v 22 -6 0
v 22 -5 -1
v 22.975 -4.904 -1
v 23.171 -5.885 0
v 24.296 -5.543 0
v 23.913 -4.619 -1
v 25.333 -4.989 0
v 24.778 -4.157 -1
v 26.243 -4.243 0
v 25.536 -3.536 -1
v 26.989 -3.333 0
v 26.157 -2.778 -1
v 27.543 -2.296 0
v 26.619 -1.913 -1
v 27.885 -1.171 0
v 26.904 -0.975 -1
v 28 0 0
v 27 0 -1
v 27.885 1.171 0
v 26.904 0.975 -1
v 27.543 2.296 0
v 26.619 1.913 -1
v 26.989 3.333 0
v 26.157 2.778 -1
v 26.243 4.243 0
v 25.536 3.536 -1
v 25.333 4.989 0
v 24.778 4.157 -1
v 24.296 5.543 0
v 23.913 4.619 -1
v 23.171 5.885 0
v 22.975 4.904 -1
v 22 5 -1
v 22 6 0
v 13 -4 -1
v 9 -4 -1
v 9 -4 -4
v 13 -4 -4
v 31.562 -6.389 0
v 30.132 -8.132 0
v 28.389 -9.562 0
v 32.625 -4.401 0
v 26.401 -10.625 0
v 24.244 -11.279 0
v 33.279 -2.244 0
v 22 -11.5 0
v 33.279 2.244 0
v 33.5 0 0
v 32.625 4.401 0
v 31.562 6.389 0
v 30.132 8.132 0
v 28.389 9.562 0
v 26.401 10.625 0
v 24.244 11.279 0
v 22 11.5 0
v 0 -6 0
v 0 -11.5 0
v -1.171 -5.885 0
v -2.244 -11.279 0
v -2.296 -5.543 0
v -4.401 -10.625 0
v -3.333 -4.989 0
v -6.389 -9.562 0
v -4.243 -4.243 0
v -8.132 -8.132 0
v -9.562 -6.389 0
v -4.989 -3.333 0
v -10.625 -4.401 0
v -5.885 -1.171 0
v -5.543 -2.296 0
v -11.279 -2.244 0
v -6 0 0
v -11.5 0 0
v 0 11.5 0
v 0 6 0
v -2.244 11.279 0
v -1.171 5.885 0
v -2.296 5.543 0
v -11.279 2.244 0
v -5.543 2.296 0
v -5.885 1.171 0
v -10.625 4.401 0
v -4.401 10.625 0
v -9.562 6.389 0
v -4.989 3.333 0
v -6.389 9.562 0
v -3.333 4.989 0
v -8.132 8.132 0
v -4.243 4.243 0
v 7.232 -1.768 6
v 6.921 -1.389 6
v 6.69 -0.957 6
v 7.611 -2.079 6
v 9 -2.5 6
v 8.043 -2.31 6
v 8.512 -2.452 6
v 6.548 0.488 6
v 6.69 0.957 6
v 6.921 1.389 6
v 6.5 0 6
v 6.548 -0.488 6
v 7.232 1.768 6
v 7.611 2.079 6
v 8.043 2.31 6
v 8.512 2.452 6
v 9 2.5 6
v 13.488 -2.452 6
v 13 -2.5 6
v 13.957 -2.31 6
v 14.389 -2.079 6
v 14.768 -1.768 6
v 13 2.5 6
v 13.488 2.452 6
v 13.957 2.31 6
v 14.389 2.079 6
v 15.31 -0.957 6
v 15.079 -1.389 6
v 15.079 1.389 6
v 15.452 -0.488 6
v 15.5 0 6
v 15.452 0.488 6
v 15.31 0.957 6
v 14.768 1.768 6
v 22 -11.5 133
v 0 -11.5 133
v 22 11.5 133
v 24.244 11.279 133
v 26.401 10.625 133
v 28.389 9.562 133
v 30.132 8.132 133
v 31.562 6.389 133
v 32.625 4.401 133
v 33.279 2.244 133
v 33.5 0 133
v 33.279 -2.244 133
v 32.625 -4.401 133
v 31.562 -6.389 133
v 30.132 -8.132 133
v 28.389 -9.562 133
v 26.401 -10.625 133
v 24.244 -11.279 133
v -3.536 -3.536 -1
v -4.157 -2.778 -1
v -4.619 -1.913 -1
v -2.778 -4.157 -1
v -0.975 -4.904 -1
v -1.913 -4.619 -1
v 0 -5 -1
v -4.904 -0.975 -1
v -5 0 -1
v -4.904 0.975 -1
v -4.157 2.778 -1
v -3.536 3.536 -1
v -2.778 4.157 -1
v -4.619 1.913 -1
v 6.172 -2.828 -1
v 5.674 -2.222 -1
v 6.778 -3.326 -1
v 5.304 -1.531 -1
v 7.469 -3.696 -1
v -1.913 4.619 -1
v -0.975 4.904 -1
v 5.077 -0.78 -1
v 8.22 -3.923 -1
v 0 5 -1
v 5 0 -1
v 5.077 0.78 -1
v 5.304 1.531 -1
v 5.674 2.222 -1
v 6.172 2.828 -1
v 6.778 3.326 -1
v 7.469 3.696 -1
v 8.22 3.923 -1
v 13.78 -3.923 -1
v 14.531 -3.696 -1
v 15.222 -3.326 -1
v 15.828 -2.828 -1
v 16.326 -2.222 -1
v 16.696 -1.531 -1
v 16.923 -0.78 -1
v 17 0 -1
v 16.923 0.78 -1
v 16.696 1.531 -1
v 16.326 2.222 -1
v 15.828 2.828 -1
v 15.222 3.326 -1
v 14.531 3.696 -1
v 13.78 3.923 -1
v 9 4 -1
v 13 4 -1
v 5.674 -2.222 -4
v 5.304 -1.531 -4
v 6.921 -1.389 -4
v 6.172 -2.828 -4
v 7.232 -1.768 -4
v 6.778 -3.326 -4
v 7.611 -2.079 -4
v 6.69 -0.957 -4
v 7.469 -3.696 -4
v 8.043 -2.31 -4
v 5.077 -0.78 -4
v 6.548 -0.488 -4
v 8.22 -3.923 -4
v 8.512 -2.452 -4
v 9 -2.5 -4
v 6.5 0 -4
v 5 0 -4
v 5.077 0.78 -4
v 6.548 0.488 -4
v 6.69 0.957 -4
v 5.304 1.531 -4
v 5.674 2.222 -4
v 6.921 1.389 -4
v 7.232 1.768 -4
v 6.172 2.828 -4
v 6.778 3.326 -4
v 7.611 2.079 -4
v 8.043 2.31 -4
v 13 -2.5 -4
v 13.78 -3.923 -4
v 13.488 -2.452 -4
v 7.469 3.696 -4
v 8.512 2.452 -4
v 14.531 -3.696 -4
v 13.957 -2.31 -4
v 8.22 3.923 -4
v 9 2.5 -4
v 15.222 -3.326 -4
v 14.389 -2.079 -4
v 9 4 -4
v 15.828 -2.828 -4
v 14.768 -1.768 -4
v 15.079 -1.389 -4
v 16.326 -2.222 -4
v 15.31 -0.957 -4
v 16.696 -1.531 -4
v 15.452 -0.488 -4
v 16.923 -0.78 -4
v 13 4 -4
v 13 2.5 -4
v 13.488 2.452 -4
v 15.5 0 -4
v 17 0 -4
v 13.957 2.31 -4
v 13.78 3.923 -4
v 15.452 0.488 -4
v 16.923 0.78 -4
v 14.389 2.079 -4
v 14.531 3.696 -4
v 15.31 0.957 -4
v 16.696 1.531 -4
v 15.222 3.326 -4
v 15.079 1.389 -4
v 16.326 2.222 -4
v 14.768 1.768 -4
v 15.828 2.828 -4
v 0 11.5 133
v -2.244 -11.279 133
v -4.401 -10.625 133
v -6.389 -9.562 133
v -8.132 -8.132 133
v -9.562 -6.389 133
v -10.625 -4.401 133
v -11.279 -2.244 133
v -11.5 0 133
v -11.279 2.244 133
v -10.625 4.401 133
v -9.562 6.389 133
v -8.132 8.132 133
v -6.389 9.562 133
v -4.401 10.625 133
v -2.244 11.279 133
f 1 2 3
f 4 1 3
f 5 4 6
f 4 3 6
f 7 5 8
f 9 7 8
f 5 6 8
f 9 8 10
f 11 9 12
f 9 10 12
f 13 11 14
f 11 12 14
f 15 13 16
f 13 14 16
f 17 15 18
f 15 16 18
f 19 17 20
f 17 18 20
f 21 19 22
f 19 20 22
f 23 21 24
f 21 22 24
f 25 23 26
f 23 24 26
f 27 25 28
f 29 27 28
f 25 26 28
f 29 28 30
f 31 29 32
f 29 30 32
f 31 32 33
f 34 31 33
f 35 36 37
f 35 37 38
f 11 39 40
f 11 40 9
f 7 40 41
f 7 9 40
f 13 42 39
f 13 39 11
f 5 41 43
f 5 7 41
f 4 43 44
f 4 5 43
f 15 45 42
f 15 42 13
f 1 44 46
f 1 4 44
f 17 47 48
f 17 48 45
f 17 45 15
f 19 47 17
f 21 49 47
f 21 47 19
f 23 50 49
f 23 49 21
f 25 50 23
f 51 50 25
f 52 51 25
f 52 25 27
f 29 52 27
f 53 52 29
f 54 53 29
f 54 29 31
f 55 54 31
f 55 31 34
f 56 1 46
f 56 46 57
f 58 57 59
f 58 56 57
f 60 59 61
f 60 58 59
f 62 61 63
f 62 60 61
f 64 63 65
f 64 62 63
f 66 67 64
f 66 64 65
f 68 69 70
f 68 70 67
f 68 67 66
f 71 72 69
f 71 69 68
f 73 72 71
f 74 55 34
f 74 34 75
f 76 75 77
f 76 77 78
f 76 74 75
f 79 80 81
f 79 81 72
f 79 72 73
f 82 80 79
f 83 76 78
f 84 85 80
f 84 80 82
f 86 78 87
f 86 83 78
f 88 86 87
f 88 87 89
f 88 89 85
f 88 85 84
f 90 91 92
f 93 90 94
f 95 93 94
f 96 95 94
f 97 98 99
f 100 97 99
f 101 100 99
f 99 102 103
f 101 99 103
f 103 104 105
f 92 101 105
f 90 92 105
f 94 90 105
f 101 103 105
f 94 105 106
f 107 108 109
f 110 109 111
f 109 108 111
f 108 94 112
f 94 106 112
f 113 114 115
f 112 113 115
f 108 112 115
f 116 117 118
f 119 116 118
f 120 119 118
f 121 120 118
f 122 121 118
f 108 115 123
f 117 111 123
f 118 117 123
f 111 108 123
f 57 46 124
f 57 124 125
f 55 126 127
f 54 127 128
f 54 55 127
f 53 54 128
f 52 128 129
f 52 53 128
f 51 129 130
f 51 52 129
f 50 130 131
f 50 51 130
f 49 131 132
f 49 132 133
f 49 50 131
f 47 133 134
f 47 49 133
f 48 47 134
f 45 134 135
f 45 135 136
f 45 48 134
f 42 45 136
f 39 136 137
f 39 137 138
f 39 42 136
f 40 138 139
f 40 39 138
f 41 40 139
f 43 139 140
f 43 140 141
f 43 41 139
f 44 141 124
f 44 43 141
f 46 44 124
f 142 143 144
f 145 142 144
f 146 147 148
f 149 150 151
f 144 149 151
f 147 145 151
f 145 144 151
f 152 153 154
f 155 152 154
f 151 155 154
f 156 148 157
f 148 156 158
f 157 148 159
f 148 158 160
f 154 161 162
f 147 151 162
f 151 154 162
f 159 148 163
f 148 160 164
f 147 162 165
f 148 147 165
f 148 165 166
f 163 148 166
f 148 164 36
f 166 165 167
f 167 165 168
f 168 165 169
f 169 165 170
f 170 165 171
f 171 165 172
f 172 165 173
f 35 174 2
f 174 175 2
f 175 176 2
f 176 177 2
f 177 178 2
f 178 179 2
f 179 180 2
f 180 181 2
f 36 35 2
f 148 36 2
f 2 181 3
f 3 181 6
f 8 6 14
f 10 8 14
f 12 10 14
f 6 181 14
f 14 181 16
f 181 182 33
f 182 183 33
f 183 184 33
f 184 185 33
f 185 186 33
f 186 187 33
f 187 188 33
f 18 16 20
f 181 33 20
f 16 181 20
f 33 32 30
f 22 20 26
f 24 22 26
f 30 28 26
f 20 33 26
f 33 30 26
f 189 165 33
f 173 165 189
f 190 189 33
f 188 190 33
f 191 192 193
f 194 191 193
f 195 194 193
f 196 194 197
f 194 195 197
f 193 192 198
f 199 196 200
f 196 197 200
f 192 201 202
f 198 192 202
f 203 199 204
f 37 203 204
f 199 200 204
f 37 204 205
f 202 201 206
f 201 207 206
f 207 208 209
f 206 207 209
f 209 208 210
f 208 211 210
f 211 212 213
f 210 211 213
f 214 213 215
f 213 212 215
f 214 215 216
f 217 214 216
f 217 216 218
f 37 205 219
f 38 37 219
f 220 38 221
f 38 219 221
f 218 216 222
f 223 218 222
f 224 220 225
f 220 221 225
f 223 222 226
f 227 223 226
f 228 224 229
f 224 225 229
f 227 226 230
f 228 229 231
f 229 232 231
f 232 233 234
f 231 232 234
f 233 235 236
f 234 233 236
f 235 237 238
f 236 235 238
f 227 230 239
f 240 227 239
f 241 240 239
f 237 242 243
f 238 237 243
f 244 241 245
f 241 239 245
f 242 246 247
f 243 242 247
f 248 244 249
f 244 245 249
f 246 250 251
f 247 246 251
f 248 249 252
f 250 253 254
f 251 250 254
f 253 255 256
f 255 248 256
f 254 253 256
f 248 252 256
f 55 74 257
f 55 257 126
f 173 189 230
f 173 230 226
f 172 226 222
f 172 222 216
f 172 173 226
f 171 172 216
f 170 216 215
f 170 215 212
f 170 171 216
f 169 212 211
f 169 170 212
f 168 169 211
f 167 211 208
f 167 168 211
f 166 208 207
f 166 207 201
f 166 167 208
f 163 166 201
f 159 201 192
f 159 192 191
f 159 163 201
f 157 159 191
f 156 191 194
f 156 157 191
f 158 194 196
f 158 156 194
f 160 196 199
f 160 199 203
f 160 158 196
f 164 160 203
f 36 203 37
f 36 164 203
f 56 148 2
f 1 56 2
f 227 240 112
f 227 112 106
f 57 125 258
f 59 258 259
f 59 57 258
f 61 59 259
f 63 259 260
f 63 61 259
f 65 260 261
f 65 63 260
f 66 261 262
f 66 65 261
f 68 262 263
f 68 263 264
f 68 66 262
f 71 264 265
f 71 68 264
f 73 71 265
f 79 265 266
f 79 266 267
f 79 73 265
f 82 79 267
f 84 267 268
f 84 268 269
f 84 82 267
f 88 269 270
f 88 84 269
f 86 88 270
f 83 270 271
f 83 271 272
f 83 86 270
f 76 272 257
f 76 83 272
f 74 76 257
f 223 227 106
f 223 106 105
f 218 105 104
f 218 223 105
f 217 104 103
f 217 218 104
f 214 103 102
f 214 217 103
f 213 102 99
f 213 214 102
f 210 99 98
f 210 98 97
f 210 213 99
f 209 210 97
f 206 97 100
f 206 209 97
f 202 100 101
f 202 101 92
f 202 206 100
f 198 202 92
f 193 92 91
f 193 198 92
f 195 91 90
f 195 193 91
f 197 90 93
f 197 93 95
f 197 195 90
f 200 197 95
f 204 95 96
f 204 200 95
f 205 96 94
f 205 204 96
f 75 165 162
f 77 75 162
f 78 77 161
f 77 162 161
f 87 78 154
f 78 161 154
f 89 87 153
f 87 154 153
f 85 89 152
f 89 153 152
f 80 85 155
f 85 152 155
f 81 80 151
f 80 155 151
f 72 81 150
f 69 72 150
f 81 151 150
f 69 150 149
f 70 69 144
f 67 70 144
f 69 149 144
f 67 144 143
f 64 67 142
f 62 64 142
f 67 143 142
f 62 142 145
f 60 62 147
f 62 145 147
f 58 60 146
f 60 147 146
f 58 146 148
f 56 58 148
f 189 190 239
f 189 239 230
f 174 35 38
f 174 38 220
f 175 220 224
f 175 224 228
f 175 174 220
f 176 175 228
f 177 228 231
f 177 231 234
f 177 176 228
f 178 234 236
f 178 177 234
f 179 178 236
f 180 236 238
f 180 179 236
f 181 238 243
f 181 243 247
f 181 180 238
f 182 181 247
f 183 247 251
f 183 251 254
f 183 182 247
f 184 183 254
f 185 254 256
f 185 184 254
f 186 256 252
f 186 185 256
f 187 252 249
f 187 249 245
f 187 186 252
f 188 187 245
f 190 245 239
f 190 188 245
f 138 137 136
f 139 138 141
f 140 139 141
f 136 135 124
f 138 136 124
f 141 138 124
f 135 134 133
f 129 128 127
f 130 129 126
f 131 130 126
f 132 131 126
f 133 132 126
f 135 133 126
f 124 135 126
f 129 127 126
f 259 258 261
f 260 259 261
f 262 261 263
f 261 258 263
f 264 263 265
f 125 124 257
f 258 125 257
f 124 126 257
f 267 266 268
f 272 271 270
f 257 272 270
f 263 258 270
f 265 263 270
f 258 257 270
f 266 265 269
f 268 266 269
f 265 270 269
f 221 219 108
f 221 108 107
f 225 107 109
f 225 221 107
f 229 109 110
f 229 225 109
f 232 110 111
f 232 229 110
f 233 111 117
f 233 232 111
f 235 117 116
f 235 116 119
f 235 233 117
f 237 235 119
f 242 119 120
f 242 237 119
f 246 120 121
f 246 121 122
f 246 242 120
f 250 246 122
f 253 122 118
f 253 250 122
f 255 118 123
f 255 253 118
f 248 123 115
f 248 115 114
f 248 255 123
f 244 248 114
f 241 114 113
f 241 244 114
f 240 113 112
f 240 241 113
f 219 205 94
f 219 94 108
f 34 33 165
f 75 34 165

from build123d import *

# Parameters (mm, degrees)
EXTRUSION1_DEPTH = 133
EXTRUSION2_DEPTH = 1
CHANFREIN1_SIZE  = 1
EXTRUSION3_DEPTH = 3
EXTRUSION4_DEPTH = 10


with BuildPart() as part:
    # Esquisse1 → Extrusion1 (new body)
    with BuildSketch(Plane.XY):
        with BuildLine():
            Line((0, 11.5), (22, 11.5))
            ThreePointArc((22, 11.5), (33.5, 0), (22, -11.5))
            Line((22, -11.5), (0, -11.5))
            ThreePointArc((0, -11.5), (-11.5, 0), (0, 11.5))
        make_face()
    extrude(amount=EXTRUSION1_DEPTH)

    # Esquisse2 → Extrusion2 (add)
    with BuildSketch(Plane(origin=(0, 0, 0), x_dir=(-1, 0, 0), z_dir=(0, 0, -1))):
        with BuildLine():
            Line((-22, 5), (0, 5))
            ThreePointArc((0, 5), (5, 0), (0, -5))
            Line((0, -5), (-22, -5))
            ThreePointArc((-22, -5), (-27, 0), (-22, 5))
        make_face()
    extrude(amount=EXTRUSION2_DEPTH)

    # Chanfrein1
    chanfrein1_edges = [part.edges().sort_by_distance(p)[0] for p in [
        (11, 5, 0),
        (-5, 0, 0),
        (27, 0, 0),
        (11, -5, 0),
    ]]
    chamfer(chanfrein1_edges, length=CHANFREIN1_SIZE - 0.0001)  # a hair under: the kernel refuses the full size

    # Esquisse3 → Extrusion3 (add)
    with BuildSketch(Plane(origin=(0, 0, -1), x_dir=(-1, 0, 0), z_dir=(0, 0, -1))):
        with BuildLine():
            Line((-13, 4), (-9, 4))
            ThreePointArc((-9, 4), (-5, 0), (-9, -4))
            Line((-9, -4), (-13, -4))
            ThreePointArc((-13, -4), (-17, 0), (-13, 4))
        make_face()
    extrude(amount=EXTRUSION3_DEPTH)

    # Esquisse4 → Extrusion4 (cut)
    with BuildSketch(Plane(origin=(0, 0, -4), x_dir=(-1, 0, 0), z_dir=(0, 0, -1))):
        with BuildLine():
            Line((-13, 2.5), (-9, 2.5))
            ThreePointArc((-9, 2.5), (-6.5, 0), (-9, -2.5))
            Line((-9, -2.5), (-13, -2.5))
            ThreePointArc((-13, -2.5), (-15.5, 0), (-13, 2.5))
        make_face()
    extrude(amount=-EXTRUSION4_DEPTH, mode=Mode.SUBTRACT)


solid = part.part
